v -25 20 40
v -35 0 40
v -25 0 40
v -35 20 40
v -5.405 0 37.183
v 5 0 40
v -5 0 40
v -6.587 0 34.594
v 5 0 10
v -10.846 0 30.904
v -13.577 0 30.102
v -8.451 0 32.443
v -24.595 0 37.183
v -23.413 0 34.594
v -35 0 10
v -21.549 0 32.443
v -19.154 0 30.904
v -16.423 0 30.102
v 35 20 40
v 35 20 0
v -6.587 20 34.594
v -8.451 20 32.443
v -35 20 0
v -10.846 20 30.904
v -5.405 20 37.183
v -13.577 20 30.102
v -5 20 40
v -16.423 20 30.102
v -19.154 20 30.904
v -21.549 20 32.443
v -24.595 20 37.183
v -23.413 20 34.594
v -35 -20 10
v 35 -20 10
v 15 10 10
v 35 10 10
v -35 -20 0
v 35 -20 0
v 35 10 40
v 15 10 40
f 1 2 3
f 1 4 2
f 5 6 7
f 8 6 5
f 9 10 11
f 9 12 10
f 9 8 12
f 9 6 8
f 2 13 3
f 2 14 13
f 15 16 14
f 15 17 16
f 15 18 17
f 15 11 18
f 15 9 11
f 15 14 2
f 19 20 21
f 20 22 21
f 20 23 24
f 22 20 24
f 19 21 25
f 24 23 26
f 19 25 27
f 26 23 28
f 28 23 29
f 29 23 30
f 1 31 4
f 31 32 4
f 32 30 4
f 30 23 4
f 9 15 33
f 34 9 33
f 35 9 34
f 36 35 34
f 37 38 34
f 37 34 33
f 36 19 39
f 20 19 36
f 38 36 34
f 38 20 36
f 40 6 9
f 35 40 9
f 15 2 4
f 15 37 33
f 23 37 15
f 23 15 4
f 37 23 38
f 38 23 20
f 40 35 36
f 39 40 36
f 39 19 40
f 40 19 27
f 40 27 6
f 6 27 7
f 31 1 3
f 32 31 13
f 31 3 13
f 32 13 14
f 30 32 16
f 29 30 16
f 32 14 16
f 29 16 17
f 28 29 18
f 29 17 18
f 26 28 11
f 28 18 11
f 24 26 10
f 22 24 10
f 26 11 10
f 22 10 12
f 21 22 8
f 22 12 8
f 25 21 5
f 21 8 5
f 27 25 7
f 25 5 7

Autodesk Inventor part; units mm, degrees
ref_plane "YZ Plane" through (0, 0, 0) normal (1, 0, 0) x (0, 1, 0)
ref_plane "XZ Plane" through (0, 0, 0) normal (0, 1, 0) x (-1, 0, 0)
ref_plane "XY Plane" through (0, 0, 0) normal (0, 0, 1) x (1, 0, 0)
sketch "草圖1" plane through (0, 0, 0) normal (0, 0, 1) x (1, 0, 0)
  line L0 (35, -20) -> (-35, -20)
  line L1 (-35, -20) -> (-35, 20)
  line L2 (-35, 20) -> (35, 20)
  line L3 (35, 20) -> (35, -20)
  line L4 (35, -20) -> (-35, 20) construction
  line L5 (-35, -20) -> (35, 20) construction
  point P0 (0, 0)
  dimension "d0" = 70
  dimension "d1" = 40
extrude "擠出1" add sketch "草圖1" along normal blind 10
sketch "草圖2" plane through (0, 0, 10) normal (0, 0, 1) x (1, 0, 0)
  line L0 (35, 20) -> (-35, 20) projected
  line L1 (-35, 20) -> (5, 20)
  line L2 (5, 20) -> (5, 0)
  line L3 (5, 0) -> (-35, 0)
  line L4 (-35, 0) -> (-35, 20)
  line L5 (35, 20) -> (15, 20)
  line L6 (15, 20) -> (15, 10)
  line L7 (15, 10) -> (35, 10)
  line L8 (35, 10) -> (35, 20)
  point P0 (0, 0)
  point P1 (5, 20)
  dimension "d4" = 20
  dimension "d5" = 10
  dimension "d6" = 40
  dimension "d7" = 20
extrude "擠出2" add sketch "草圖2" along normal blind 30
sketch "草圖3" plane through (-35, 0, 10) normal (0, -1, 0) x (1, 0, 0)
  circle A0 centre (20, 30) radius 10
  line L0 (0, 0) -> (0, 30) projected
  line L1 (0, 0) -> (70, 0) projected
  point P0 (35, -10)
  dimension "d14" = 20
  dimension "d15" = 20
  dimension "d16" = 30
extrude "擠出3" cut sketch "草圖3" against normal blind 30
sketch "草圖4" plane through (5, 0, 10) normal (1, 0, 0) x (0, 0, -1)
  line L0 (-30, 20) -> (-30, 0) projected
  line L1 (-30, 0) -> (-0.078, 0)
  line L2 (-0.078, 0) -> (-0.078, 20)
  line L3 (-0.078, 20) -> (-30, 20)
  line L4 (-30, 20) -> (-30, 0)
  point P0 (10, 0)
loft "斷面混成2" add section 1 edges at (15, 15, 10) (15, 10, 25) (15, 15, 40) (15, 20, 25) section 2 edges at (5, 10, 10) (5, 20, 25) (5, 10, 40) (5, 0, 25)
properties part number "件28"
